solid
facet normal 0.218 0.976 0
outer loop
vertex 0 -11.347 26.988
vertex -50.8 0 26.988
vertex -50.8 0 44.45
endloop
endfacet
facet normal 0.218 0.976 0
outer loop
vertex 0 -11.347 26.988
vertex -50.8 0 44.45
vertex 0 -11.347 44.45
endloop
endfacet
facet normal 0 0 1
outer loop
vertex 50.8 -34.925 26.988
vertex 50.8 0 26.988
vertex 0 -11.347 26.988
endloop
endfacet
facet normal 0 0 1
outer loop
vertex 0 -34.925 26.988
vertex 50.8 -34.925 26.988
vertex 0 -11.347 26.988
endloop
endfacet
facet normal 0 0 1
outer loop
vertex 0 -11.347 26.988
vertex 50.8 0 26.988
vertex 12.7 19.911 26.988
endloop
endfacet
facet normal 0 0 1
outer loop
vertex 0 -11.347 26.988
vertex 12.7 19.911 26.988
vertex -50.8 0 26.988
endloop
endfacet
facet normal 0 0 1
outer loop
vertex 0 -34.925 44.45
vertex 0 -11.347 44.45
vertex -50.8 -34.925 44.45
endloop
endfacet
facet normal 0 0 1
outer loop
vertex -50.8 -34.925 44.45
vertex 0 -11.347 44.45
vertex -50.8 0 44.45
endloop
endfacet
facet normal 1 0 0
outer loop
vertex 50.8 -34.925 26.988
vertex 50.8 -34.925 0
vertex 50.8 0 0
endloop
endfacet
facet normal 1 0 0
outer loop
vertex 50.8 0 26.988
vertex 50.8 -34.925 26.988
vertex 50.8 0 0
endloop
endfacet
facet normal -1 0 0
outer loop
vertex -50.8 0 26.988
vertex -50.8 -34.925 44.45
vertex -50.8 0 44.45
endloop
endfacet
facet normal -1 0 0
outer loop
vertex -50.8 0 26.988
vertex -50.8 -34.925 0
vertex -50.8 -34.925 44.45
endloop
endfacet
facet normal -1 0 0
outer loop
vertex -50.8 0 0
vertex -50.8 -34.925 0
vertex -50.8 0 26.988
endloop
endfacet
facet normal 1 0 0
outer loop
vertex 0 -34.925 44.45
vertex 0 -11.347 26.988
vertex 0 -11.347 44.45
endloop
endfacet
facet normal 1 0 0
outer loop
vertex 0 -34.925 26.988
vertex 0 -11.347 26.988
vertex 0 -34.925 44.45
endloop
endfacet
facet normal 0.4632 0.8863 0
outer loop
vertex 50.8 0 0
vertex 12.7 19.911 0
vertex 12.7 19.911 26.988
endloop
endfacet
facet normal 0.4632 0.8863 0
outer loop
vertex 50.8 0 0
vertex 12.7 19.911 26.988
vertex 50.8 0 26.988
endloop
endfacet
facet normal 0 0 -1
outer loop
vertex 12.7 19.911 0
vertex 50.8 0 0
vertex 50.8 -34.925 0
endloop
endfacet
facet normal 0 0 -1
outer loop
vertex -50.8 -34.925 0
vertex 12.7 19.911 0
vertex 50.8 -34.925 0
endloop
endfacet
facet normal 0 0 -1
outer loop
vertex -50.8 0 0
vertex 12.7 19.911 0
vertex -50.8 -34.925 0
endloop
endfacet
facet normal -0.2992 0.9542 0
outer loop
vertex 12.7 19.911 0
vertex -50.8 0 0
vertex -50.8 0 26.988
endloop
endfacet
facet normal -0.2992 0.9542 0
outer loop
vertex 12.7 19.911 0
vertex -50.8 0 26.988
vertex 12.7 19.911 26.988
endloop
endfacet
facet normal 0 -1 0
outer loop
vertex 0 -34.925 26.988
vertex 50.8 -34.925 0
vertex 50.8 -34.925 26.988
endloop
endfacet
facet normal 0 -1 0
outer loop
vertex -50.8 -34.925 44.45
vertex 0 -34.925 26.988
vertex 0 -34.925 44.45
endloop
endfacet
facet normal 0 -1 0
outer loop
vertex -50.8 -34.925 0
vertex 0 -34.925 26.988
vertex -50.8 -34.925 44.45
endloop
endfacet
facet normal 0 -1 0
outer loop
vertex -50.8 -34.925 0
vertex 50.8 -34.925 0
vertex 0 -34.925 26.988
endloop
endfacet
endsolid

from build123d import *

# Parameters (mm, degrees)
SKETCH1_W           = 101.6
SKETCH1_H           = 34.925
BOSS_EXTRUDE2_DEPTH = 26.9875
BOSS_EXTRUDE3_DEPTH = 17.4625


with BuildPart() as part:
    # Sketch1 → Boss-Extrude2 (new body)
    with BuildSketch(Plane.XY):
        Polygon((12.7, 19.910607408), (50.8, 0), (-50.8, 0), align=None)
        with Locations((0, -17.4625)):
            Rectangle(SKETCH1_W, SKETCH1_H)
    extrude(amount=BOSS_EXTRUDE2_DEPTH)

    # Sketch3 → Boss-Extrude3 (add)
    with BuildSketch(Plane.XY.offset(26.9875)):
        Polygon((-50.8, 0), (0, -11.346798656), (0, -34.925), (-50.8, -34.925), align=None)
    extrude(amount=BOSS_EXTRUDE3_DEPTH)


solid = part.part
